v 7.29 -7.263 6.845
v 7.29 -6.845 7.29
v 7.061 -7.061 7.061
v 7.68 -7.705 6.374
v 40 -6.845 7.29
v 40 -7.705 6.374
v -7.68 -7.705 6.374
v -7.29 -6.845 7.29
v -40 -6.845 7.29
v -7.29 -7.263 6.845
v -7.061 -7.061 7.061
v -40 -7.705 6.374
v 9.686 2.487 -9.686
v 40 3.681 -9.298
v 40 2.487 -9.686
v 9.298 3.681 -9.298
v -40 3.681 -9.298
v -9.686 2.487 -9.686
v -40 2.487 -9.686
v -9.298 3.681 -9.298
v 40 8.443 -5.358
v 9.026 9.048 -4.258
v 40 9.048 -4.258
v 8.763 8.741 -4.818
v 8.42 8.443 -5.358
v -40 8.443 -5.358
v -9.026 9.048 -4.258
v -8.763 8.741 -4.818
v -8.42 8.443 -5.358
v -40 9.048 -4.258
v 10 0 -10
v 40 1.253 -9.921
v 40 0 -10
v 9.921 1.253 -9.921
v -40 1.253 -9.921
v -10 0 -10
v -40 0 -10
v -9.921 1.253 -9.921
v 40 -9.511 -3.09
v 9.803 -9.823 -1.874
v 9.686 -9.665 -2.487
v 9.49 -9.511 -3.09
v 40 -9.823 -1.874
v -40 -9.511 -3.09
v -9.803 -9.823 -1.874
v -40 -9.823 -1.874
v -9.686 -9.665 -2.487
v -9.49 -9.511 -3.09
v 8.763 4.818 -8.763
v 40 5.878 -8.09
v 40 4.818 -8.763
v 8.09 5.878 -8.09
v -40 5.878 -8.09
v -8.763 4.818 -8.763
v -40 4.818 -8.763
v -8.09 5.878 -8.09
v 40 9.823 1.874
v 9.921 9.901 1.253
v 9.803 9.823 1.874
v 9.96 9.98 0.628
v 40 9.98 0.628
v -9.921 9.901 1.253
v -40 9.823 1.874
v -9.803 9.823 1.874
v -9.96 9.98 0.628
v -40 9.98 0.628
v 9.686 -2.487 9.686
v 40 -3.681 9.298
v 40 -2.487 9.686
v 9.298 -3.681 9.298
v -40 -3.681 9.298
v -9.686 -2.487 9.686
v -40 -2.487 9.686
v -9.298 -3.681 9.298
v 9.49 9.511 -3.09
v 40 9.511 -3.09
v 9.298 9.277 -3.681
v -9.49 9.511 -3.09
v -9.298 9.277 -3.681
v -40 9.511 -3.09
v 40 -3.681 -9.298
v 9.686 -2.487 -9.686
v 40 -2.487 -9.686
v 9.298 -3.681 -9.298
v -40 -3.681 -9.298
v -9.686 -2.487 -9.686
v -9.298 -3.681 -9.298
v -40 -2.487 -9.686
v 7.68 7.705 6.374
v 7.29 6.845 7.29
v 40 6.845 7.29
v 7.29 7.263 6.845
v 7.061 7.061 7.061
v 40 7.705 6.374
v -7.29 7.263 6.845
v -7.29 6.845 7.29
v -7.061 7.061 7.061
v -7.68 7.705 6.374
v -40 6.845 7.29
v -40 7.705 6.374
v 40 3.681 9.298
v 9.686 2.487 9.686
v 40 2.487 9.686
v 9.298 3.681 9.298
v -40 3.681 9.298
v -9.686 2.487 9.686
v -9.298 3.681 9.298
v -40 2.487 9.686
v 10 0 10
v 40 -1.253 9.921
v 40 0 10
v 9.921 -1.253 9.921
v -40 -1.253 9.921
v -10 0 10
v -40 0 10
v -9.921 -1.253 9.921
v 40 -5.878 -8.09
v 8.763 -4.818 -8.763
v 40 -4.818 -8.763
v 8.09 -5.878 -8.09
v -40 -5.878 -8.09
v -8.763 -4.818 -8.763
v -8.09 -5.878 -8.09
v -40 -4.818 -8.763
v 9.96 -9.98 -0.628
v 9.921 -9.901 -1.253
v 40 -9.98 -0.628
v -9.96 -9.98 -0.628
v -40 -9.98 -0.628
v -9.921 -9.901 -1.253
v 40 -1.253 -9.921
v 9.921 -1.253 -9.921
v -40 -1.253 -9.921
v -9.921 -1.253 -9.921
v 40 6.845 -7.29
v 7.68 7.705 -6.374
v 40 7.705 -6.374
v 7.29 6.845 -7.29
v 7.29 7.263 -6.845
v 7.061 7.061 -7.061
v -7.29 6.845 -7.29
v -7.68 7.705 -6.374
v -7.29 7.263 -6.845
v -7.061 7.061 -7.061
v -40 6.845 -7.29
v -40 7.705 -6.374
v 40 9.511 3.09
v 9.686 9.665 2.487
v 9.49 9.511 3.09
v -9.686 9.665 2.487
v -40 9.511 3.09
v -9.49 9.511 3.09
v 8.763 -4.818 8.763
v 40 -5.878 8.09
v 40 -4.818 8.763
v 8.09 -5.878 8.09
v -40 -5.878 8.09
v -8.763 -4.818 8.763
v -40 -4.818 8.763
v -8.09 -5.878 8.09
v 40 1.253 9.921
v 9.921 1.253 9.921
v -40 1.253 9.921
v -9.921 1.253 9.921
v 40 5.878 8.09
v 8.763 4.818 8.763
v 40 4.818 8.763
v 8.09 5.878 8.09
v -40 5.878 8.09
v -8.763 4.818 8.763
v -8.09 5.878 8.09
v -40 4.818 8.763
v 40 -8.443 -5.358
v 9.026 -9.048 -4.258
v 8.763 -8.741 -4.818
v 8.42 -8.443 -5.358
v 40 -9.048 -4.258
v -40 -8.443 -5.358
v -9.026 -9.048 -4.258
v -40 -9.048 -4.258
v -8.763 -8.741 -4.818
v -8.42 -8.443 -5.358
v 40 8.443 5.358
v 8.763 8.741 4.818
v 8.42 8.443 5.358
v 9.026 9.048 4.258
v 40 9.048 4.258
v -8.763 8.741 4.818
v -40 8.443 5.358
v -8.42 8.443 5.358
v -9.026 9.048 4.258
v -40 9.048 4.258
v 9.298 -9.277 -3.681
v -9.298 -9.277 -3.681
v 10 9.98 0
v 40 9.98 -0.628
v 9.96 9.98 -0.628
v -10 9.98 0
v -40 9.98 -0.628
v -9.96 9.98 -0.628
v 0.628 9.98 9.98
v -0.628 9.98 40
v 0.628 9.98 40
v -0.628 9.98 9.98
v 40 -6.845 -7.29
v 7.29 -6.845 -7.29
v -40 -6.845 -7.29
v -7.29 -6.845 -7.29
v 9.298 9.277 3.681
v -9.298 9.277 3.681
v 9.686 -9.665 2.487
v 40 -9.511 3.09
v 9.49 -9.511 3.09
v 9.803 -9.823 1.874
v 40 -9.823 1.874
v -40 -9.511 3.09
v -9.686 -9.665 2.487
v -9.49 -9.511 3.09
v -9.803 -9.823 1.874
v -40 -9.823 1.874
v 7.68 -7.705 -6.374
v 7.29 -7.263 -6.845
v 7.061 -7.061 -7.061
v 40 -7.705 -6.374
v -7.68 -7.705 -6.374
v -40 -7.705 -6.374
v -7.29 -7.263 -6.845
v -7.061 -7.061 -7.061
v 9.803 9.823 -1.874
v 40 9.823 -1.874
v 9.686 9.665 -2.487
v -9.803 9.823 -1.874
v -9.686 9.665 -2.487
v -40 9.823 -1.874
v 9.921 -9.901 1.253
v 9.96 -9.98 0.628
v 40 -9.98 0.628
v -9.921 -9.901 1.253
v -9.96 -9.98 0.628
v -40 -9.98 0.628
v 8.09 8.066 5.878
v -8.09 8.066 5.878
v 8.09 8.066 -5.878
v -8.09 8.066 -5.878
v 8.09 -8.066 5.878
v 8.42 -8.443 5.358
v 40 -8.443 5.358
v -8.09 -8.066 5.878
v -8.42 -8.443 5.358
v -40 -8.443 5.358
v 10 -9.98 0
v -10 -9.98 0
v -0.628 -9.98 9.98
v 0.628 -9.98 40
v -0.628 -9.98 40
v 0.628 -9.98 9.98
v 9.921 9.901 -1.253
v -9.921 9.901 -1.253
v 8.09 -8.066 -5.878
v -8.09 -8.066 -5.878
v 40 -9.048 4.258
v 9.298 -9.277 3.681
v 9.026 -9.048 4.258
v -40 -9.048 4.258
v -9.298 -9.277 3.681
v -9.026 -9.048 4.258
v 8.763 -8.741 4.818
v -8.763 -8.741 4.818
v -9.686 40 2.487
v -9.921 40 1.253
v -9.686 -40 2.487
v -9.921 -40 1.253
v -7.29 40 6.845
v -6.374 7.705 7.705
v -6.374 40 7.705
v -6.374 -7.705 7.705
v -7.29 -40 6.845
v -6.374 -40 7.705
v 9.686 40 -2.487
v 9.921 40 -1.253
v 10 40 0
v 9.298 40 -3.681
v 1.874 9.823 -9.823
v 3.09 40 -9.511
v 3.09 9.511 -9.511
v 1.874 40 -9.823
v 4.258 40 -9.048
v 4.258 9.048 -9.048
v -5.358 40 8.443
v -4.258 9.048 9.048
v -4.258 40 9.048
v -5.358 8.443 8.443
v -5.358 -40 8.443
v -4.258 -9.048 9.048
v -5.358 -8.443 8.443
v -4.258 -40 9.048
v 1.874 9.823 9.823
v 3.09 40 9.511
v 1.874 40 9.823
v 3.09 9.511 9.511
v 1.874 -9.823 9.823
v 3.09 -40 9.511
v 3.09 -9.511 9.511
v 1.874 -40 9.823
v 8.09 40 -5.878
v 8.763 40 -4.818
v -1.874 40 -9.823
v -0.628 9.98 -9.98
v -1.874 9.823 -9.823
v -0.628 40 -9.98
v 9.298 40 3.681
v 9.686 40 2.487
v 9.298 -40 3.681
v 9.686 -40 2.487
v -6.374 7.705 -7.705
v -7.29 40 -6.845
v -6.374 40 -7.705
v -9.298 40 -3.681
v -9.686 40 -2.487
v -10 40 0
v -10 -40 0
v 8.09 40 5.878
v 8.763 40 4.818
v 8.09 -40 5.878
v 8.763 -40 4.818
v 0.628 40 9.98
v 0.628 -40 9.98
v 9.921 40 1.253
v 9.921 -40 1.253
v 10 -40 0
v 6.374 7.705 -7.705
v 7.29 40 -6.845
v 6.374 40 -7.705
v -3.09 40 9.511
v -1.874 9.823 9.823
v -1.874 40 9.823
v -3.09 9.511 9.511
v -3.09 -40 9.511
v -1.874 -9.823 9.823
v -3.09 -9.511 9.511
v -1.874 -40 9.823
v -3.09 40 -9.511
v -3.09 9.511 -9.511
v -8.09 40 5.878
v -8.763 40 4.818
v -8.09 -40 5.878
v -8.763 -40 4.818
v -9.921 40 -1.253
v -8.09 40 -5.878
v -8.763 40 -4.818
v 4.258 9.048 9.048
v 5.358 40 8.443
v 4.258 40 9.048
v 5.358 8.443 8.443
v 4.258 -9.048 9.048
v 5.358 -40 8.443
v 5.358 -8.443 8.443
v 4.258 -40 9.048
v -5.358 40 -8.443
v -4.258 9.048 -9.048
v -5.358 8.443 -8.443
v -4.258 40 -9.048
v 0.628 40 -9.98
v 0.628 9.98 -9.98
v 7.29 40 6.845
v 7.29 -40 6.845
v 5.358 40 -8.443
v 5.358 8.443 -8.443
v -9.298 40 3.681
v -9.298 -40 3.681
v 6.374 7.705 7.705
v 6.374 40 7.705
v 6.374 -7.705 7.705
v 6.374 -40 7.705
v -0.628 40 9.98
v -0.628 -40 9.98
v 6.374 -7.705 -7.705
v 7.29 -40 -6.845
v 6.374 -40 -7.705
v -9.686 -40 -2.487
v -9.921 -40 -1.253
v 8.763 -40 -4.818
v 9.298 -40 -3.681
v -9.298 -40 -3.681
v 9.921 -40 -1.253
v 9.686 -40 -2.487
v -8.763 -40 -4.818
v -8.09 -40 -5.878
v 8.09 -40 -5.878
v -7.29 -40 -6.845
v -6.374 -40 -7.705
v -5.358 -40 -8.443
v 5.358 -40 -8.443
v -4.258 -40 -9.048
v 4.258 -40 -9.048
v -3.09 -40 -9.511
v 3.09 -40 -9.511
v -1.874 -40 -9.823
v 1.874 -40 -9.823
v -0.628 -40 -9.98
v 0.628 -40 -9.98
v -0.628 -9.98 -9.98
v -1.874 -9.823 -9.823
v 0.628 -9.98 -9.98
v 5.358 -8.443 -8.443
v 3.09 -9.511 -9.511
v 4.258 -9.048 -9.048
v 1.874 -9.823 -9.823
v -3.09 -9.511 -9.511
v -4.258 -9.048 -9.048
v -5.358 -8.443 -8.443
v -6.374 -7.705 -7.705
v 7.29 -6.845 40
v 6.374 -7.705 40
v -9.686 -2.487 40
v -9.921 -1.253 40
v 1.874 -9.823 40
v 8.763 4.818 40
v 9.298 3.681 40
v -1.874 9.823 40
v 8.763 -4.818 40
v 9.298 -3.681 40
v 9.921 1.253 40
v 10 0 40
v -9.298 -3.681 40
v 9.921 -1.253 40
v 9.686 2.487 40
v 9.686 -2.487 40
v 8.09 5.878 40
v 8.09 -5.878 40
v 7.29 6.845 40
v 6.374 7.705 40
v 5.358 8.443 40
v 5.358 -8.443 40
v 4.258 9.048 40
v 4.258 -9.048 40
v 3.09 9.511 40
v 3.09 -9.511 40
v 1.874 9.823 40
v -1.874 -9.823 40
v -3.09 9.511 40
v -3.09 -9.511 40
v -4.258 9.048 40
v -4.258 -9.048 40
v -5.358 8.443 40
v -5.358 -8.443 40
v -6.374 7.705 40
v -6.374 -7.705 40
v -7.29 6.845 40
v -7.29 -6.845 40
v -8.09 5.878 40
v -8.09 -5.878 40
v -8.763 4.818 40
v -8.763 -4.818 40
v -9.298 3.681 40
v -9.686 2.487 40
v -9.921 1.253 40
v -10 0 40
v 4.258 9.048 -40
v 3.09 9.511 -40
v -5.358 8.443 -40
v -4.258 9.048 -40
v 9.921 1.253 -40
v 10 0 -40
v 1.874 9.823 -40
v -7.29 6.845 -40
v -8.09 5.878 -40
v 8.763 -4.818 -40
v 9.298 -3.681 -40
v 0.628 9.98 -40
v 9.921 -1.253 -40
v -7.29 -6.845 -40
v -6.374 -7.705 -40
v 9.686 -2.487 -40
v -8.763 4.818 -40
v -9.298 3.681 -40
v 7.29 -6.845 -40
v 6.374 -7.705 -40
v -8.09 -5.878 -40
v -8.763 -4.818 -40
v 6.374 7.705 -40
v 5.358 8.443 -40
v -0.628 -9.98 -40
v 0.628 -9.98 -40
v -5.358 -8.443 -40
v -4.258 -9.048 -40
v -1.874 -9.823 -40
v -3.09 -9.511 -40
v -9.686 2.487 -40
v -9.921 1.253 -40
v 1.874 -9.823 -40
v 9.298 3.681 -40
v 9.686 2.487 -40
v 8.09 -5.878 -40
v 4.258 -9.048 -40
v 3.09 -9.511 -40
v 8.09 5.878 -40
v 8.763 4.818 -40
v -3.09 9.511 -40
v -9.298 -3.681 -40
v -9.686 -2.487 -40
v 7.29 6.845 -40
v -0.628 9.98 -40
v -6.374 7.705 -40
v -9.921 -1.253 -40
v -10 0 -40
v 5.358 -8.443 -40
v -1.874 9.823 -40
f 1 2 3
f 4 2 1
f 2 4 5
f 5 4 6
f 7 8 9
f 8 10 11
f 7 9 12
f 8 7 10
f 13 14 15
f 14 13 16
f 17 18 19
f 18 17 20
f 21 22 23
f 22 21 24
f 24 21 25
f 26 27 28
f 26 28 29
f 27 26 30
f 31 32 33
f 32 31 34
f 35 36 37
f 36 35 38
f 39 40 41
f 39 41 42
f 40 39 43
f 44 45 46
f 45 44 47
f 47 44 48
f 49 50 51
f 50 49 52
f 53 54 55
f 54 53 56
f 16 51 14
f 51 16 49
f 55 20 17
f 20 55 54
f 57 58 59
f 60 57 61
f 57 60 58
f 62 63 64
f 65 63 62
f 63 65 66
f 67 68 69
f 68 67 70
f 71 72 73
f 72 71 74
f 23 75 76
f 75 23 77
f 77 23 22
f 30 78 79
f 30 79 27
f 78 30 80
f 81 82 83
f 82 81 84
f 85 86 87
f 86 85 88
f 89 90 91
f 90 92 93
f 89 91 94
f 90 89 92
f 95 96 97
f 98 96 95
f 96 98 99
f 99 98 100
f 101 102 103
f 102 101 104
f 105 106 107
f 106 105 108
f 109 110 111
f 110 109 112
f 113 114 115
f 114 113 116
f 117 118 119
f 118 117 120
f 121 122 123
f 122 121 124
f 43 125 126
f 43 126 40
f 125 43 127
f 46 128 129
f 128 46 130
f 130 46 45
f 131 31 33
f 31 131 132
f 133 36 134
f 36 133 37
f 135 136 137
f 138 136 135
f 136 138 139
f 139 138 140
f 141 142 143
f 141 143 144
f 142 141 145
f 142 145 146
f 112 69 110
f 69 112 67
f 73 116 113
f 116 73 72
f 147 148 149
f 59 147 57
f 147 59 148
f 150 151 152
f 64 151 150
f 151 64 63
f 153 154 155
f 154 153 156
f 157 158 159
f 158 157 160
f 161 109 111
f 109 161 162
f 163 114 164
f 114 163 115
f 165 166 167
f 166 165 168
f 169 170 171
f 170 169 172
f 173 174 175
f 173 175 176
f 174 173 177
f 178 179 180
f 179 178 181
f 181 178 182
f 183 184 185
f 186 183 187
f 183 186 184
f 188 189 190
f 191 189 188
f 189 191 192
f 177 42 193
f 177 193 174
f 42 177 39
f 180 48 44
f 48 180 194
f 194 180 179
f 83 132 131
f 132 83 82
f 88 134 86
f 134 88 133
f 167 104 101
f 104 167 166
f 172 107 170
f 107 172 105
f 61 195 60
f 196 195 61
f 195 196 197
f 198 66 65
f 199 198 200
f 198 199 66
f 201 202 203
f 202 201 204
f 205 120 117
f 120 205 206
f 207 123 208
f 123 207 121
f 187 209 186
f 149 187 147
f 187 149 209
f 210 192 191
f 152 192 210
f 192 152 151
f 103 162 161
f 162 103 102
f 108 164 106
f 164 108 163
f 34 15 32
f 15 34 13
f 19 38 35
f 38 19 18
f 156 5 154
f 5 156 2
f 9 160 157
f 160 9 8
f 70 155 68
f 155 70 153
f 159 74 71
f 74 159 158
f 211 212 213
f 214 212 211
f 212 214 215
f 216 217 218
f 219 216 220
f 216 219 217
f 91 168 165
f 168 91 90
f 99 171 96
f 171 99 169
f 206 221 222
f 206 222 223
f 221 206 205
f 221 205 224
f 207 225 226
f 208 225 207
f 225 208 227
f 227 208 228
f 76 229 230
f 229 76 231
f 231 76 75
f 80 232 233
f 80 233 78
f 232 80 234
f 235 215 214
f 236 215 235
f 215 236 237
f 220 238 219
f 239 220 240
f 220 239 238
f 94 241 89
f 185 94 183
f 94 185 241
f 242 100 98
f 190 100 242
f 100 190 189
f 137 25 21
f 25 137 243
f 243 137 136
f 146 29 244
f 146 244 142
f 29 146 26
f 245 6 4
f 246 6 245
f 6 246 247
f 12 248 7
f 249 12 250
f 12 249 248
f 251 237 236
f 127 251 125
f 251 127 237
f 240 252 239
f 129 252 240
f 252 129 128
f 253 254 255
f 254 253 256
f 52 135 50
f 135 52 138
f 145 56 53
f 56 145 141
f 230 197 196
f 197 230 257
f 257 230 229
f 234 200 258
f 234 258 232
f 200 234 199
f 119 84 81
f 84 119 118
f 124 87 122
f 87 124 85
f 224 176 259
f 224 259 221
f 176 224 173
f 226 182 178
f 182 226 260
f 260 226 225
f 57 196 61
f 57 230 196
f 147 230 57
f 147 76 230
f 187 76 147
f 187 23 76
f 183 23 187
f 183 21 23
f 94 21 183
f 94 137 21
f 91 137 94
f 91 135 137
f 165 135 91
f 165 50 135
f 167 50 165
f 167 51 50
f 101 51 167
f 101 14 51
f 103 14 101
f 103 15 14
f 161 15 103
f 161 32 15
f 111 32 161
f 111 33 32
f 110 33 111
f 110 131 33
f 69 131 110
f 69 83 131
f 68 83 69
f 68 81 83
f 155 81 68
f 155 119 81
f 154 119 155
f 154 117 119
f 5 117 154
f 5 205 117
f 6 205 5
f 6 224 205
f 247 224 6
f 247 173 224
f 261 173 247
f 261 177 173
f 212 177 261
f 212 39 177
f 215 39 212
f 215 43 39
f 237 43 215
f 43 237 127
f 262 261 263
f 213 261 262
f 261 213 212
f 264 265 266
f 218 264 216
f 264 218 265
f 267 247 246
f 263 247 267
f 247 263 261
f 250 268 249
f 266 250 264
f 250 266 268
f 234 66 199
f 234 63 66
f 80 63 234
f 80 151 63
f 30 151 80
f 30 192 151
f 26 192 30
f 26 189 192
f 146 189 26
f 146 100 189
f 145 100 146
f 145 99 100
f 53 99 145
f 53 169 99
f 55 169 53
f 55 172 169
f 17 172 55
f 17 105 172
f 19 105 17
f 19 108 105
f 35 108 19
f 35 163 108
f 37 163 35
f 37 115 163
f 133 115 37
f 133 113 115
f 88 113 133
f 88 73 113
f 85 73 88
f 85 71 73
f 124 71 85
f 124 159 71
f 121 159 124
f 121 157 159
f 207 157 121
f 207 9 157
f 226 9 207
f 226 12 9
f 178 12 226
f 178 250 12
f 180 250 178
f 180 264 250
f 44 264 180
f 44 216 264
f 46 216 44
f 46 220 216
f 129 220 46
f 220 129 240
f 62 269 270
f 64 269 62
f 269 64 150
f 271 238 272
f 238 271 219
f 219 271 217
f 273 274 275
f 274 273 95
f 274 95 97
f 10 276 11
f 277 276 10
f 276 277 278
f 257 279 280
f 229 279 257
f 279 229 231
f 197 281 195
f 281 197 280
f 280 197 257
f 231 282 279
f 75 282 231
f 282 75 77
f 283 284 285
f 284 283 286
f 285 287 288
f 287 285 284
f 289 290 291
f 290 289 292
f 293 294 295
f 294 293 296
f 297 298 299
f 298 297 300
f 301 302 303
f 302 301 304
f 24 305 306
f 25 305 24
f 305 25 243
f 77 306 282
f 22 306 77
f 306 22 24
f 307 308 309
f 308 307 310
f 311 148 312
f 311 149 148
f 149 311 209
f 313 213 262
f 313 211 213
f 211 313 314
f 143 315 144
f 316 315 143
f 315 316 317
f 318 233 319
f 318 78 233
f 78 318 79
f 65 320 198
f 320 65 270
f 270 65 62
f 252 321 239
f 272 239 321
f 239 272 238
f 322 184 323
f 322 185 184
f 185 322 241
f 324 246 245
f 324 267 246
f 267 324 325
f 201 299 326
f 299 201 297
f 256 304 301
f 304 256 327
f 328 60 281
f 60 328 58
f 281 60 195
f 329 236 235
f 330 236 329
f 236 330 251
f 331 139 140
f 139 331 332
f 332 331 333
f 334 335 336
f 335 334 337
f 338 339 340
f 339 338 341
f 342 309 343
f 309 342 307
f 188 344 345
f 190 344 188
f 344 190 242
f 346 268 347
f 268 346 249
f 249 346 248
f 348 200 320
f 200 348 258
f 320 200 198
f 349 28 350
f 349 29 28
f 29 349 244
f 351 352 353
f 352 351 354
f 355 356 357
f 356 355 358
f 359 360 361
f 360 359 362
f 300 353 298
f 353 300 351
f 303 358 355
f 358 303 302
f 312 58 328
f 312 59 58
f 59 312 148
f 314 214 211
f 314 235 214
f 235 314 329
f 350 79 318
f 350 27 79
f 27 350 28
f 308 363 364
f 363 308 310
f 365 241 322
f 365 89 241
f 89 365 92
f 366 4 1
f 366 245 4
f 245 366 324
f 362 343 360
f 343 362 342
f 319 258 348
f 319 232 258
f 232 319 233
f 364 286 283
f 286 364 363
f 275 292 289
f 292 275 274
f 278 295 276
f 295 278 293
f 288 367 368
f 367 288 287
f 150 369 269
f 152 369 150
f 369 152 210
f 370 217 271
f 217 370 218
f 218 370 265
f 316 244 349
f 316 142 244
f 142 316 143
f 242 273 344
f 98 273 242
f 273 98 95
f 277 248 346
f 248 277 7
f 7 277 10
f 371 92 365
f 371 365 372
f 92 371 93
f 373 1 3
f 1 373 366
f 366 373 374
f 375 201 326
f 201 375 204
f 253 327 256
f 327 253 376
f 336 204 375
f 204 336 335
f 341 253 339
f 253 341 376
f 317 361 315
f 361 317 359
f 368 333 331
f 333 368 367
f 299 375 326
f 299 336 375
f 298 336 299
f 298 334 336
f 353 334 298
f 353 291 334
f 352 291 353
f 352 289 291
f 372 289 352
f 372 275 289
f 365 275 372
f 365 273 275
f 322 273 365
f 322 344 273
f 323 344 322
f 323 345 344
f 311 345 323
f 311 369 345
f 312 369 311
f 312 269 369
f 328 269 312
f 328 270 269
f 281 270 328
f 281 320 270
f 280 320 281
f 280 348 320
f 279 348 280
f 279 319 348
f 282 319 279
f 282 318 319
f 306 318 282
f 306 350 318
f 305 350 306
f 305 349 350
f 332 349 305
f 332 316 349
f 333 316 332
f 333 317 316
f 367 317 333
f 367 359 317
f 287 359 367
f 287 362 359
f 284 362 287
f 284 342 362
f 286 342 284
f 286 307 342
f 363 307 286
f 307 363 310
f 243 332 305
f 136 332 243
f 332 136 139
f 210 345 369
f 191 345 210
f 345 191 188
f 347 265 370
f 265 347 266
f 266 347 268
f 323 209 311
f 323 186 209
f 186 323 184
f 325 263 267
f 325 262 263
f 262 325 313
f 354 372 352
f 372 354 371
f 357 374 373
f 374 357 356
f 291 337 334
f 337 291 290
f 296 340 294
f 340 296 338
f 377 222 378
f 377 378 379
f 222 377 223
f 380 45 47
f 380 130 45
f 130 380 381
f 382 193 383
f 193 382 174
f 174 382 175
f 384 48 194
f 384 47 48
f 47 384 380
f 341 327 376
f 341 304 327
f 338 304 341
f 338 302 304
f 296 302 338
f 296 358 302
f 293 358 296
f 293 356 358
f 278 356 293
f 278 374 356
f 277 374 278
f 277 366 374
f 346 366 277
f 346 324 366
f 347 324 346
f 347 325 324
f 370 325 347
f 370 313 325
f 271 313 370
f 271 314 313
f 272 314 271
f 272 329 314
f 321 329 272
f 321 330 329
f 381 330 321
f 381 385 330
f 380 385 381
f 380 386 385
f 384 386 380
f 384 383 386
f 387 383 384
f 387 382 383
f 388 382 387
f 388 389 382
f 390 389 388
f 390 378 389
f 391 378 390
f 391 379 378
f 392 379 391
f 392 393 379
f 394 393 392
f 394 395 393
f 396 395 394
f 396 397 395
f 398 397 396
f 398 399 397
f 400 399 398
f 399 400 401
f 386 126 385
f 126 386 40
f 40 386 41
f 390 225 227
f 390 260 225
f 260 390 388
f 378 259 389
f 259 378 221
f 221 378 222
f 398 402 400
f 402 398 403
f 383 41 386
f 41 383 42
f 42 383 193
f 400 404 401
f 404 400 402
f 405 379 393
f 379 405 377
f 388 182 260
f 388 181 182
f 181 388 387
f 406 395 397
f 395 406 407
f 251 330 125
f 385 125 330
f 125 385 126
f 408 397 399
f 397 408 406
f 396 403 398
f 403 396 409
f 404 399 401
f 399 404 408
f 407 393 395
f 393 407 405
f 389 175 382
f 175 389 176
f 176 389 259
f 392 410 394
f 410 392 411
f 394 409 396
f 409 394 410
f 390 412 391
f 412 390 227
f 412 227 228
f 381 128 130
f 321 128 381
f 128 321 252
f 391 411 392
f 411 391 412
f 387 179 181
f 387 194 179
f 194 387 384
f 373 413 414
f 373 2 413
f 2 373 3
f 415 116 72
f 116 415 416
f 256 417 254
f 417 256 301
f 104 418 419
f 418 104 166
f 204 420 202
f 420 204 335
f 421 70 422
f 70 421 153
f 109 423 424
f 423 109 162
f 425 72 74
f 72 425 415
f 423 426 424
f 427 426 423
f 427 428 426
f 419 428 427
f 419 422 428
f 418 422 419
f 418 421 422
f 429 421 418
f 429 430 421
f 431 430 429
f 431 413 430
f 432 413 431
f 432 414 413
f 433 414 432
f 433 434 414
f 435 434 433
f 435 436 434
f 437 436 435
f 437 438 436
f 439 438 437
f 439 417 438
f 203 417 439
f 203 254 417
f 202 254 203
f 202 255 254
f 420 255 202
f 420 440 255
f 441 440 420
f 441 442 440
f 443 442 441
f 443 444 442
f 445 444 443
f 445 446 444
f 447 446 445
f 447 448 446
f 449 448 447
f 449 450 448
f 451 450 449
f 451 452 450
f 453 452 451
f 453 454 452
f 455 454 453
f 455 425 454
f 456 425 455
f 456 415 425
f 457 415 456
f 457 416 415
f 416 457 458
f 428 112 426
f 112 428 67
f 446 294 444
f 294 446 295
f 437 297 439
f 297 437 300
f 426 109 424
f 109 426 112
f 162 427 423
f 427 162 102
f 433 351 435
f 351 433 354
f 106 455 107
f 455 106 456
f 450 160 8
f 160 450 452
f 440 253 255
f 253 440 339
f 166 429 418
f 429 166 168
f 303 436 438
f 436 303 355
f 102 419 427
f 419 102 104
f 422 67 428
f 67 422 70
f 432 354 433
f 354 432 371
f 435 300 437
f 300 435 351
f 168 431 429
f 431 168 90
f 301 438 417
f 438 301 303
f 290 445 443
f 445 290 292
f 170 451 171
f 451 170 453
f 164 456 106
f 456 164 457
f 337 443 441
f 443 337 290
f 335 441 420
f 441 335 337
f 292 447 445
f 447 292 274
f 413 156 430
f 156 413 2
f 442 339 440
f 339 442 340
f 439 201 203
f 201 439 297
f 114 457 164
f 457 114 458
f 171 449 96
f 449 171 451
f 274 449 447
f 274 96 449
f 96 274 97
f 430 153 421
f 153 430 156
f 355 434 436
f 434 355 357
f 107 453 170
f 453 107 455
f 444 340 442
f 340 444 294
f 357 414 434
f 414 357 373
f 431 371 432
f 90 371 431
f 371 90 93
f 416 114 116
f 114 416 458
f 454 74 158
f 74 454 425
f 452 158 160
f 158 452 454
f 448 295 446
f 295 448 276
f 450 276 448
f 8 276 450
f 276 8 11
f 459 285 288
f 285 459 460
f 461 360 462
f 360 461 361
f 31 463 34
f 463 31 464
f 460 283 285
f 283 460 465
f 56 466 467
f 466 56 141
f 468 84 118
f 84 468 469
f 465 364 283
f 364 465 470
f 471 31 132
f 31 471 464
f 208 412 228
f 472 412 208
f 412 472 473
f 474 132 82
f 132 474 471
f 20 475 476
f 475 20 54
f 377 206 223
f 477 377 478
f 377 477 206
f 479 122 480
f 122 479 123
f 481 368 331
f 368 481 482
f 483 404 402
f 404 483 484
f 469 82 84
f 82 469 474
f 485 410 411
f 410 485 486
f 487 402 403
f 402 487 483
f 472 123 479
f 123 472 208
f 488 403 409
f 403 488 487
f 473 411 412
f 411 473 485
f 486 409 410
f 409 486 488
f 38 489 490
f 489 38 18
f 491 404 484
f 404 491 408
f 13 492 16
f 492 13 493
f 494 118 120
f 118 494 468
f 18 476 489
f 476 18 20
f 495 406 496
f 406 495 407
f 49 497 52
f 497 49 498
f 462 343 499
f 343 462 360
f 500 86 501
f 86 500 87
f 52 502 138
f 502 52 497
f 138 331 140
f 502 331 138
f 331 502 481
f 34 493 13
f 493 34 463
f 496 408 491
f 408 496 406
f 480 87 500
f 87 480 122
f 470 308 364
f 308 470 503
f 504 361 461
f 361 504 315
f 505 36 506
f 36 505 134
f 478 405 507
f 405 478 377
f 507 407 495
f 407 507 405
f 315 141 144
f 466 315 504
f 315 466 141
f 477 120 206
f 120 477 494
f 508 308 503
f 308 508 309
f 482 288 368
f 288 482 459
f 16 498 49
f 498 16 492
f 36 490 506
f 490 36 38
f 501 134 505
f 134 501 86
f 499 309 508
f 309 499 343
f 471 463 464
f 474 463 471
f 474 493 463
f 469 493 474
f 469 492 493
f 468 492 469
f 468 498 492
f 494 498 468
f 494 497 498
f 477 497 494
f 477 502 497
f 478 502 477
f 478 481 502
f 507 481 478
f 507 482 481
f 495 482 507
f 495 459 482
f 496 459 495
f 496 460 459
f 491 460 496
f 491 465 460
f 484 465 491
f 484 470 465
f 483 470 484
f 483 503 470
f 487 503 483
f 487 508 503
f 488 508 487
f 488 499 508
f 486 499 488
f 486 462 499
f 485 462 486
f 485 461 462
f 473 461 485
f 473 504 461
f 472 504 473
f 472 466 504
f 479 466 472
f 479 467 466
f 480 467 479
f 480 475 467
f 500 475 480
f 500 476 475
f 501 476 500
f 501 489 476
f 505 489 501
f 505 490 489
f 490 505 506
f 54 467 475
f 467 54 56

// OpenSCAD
// --- Customizable Parametric Hub ---

// [Dimensions]
// Diameter of the tubes (in mm)
tube_diameter = 20.0; 
// Length of each branch extending from the center (in mm)
branch_length = 40.0; 
// Size of the central intersection block (in mm)
hub_diameter = 24.0;  

// [Branch Toggles]
// Change to 'false' to remove a specific branch
enable_x_pos = true;  // Right (+X)
enable_x_neg = true;  // Left (-X)

enable_y_pos = true;  // Back (+Y)
enable_y_neg = true;  // Front (-Y)

enable_z_pos = true;  // Top (+Z)
enable_z_neg = true;  // Bottom (-Z)


/* [Hidden] */
// Increase this number for smoother cylinders (e.g., 64 or 100)
$fn = 50; 

module branch(diameter=tube_diameter, length=branch_length) {
    cylinder(d=diameter, h=length);
}

module parametric_hub() {
    union() {
        // Central hub to create a clean, slightly reinforced intersection
        sphere(d=hub_diameter);
        
        // X-Axis branches
        if (enable_x_pos) rotate([0, 90, 0]) branch();
        if (enable_x_neg) rotate([0, -90, 0]) branch();
        
        // Y-Axis branches
        if (enable_y_pos) rotate([-90, 0, 0]) branch();
        if (enable_y_neg) rotate([90, 0, 0]) branch();
        
        // Z-Axis branches
        if (enable_z_pos) branch();
        if (enable_z_neg) rotate([180, 0, 0]) branch();
    }
}

// Render the model
parametric_hub();
